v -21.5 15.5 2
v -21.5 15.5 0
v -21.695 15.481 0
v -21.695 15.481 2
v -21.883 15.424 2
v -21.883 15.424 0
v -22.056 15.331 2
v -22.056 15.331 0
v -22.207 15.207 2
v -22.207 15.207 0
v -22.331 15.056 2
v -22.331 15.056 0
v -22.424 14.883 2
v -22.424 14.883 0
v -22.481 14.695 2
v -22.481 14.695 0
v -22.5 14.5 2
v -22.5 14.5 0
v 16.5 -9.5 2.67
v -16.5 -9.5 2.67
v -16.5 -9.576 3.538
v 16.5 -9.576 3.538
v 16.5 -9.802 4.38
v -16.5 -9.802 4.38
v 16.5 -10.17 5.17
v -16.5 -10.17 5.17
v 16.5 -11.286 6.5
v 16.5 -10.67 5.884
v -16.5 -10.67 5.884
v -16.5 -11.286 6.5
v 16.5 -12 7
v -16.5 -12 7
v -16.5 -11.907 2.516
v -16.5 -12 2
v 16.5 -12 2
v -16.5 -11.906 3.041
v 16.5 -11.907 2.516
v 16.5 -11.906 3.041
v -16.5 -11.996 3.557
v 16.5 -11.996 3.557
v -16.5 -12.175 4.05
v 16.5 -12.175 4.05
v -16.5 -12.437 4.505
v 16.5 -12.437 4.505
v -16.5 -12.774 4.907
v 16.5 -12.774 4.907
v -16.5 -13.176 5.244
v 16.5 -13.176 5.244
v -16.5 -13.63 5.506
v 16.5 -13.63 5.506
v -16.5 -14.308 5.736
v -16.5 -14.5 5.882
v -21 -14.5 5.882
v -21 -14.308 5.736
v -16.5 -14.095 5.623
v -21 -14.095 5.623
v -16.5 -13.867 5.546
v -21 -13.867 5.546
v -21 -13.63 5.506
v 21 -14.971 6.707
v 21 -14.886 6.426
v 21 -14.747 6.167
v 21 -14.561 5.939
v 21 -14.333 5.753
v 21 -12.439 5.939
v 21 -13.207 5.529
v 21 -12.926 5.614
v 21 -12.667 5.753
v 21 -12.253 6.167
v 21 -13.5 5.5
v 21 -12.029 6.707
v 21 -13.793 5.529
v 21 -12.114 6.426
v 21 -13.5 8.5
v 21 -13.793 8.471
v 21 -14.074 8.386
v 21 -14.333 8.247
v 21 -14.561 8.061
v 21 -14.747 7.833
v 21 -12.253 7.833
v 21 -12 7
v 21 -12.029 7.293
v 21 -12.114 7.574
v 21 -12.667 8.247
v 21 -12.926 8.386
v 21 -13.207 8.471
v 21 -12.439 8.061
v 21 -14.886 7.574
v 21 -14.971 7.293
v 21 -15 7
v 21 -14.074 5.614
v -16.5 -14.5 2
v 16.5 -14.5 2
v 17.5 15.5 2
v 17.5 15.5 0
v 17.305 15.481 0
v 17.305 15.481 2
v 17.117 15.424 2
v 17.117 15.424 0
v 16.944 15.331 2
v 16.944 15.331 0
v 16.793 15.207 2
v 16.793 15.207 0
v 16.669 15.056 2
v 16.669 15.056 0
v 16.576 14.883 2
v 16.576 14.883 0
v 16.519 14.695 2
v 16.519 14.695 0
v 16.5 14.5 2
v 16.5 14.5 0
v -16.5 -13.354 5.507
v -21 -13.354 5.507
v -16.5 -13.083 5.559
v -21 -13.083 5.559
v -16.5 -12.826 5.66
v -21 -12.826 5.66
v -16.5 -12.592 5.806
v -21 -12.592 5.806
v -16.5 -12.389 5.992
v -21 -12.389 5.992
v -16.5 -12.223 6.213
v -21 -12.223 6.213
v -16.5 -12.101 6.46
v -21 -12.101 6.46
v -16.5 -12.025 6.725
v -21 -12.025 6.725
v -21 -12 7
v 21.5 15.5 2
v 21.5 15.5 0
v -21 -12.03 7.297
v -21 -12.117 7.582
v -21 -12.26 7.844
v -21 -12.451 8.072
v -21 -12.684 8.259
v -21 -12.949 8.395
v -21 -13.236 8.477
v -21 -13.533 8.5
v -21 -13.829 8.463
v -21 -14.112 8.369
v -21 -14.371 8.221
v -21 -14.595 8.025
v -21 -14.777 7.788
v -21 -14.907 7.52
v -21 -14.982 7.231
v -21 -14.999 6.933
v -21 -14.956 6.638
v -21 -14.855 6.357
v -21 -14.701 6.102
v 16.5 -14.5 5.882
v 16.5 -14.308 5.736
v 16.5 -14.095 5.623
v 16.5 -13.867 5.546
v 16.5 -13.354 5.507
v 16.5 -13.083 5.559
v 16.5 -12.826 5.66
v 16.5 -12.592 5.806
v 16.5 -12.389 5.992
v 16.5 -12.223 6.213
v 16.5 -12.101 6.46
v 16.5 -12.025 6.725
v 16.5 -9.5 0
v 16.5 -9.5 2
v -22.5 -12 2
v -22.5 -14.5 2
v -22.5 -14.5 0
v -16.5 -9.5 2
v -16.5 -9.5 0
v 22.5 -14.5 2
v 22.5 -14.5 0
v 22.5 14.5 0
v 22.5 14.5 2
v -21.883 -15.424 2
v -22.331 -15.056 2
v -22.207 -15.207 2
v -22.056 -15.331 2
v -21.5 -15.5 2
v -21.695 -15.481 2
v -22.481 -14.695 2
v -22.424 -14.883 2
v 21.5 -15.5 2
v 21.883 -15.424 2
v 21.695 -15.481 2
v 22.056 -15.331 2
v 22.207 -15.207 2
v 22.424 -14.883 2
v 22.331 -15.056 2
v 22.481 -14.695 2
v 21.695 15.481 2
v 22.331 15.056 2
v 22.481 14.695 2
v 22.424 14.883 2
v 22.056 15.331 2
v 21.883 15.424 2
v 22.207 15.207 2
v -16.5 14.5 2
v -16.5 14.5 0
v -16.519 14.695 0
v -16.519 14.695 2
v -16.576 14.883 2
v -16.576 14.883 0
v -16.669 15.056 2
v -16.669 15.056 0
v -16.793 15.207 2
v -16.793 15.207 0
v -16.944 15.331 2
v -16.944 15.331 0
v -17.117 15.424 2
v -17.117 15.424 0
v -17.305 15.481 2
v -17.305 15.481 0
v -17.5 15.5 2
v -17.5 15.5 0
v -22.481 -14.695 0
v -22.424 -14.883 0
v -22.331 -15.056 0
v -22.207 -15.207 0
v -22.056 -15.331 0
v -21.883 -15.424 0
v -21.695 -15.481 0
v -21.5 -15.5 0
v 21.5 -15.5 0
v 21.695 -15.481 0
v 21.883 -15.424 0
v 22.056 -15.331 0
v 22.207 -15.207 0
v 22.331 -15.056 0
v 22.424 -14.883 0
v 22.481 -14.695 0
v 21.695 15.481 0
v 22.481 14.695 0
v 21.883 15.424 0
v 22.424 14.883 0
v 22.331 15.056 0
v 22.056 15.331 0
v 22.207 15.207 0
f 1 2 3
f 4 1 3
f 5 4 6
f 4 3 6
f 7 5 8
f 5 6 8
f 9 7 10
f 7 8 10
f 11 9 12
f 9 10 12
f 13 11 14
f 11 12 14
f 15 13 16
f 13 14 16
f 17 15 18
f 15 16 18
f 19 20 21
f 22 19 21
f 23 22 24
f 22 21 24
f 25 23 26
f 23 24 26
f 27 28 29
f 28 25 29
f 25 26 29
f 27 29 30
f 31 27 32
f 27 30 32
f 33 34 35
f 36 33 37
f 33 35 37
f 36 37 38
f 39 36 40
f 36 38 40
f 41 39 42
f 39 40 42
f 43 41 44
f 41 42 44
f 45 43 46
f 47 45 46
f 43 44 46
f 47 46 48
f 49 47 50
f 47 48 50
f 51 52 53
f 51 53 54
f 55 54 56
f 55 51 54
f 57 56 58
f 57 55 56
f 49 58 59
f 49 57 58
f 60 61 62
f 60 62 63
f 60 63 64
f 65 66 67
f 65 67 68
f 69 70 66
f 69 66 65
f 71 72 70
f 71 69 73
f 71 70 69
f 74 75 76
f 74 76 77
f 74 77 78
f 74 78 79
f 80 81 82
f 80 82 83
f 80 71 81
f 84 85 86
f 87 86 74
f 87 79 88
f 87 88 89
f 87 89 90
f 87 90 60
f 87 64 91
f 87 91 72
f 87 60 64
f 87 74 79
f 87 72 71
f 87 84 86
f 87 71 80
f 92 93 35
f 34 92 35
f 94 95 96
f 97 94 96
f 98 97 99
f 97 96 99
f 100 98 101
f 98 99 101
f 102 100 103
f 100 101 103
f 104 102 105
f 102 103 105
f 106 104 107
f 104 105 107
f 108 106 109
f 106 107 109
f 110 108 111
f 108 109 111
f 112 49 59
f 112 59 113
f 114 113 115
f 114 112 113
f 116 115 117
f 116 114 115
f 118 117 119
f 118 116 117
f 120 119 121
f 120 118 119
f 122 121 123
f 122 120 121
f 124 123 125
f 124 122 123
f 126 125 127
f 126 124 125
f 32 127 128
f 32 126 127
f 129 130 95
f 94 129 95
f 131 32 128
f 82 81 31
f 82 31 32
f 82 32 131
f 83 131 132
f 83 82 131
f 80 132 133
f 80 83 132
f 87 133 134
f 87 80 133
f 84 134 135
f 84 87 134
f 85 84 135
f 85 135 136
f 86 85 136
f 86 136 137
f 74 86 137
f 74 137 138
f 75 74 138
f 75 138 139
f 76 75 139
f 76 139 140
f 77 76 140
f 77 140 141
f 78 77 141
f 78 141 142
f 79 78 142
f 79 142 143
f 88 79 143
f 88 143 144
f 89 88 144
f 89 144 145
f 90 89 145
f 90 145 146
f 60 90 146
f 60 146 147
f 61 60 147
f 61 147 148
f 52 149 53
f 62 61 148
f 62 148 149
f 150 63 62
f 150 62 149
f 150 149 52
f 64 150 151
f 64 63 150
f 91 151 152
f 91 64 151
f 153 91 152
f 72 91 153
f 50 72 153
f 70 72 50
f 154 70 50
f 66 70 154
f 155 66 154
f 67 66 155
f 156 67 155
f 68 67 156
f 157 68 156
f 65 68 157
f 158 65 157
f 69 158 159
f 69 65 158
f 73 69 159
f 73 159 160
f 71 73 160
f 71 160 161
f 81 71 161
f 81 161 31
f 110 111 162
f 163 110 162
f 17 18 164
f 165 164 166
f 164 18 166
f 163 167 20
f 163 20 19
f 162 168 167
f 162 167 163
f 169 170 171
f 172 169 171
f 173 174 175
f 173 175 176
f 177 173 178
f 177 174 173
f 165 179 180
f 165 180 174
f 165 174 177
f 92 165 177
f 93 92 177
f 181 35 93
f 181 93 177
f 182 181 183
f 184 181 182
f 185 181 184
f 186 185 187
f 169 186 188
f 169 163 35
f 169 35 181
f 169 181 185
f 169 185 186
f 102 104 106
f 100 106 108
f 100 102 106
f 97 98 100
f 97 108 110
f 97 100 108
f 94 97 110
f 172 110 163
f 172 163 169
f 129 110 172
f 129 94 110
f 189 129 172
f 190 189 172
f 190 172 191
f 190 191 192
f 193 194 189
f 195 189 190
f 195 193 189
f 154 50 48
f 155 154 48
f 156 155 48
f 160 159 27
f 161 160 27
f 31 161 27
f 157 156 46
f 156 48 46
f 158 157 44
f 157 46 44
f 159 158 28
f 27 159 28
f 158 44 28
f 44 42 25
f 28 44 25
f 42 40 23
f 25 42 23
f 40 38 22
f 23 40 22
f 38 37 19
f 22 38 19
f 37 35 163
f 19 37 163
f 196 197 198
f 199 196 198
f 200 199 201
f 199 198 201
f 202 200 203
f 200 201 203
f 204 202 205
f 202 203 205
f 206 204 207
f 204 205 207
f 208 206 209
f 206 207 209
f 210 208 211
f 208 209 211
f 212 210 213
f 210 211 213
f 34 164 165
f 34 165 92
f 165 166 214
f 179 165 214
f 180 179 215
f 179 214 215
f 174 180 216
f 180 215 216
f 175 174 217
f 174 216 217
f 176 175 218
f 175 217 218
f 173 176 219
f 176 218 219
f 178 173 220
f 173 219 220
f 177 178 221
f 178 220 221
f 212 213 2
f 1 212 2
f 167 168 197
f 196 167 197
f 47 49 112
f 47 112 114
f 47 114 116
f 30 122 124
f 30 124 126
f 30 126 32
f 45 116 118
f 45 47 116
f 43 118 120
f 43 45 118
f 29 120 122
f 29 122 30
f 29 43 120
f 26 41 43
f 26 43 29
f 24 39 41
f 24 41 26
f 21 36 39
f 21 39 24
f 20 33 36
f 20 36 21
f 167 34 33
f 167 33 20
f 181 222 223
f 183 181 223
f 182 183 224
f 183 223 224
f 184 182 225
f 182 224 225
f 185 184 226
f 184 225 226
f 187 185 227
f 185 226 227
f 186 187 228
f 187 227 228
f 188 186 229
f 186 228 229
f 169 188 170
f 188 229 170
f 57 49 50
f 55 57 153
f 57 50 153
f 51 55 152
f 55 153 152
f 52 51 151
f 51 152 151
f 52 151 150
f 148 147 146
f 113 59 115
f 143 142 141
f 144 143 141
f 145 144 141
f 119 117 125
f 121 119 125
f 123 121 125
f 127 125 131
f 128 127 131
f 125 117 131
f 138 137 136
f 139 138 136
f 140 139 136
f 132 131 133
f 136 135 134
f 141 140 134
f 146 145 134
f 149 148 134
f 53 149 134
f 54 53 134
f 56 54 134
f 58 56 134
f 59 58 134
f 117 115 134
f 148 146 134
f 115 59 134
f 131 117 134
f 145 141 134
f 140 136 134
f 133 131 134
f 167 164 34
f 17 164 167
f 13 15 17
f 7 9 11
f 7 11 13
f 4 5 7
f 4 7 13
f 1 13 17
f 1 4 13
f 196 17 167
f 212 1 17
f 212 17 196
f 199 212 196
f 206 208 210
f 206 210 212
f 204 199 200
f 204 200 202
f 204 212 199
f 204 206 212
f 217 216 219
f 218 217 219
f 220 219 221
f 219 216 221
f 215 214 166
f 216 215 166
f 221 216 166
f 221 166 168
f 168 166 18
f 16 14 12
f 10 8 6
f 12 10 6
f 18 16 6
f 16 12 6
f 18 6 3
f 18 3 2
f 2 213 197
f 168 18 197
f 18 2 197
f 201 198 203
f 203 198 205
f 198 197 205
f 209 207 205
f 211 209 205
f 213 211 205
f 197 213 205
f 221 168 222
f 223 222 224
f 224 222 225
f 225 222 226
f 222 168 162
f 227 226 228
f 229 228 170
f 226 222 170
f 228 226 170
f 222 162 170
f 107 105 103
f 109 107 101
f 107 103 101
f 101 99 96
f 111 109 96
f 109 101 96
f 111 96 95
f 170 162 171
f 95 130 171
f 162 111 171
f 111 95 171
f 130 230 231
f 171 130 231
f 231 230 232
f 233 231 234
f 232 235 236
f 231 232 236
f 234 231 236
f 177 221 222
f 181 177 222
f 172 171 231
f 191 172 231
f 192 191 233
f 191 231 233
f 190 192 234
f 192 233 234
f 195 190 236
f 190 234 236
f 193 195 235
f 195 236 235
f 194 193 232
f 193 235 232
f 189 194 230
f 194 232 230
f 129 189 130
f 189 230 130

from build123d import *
from build123d import SkipClean  # not in build123d's __all__

# Parameters (mm, degrees)
F1_DEPTH    = 2
F2_W        = 33
F2_H        = 5
F3_DEPTH    = 5
F6_R        = 1.5
F7_DEPTH    = 42
F8_T1_DEPTH = 54.6506350946
F10_DEPTH   = 39.001


# Not quite as in the source:
# - a fillet or chamfer that OpenCascade refuses, or shapes differently, is made with other operations: its cross-section is extruded or revolved along the edge and cut away or added


with BuildPart() as f1:
    # F0 (on Top) → F1 (new body)
    with BuildSketch(Plane.XY):
        with BuildLine():
            Line((-21.5, -15.5), (21.5, -15.5))
            ThreePointArc((21.5, -15.5), (22.2071067812, -15.2071067812), (22.5, -14.5))
            Line((22.5, -14.5), (22.5, 14.5))
            ThreePointArc((22.5, 14.5), (22.2071067812, 15.2071067812), (21.5, 15.5))
            Line((21.5, 15.5), (17.5, 15.5))
            ThreePointArc((17.5, 15.5), (16.7928932188, 15.2071067812), (16.5, 14.5))
            Line((16.5, 14.5), (16.5, -9.5))
            Line((16.5, -9.5), (-16.5, -9.5))
            Line((-16.5, -9.5), (-16.5, 14.5))
            ThreePointArc((-16.5, 14.5), (-16.7928932188, 15.2071067812), (-17.5, 15.5))
            Line((-17.5, 15.5), (-21.5, 15.5))
            ThreePointArc((-21.5, 15.5), (-22.2071067812, 15.2071067812), (-22.5, 14.5))
            Line((-22.5, 14.5), (-22.5, -14.5))
            ThreePointArc((-22.5, -14.5), (-22.2071067812, -15.2071067812), (-21.5, -15.5))
        make_face()
    extrude(amount=F1_DEPTH)

    # F2 (on face) → F3 (join)
    with BuildSketch(Plane.XY.offset(2)):
        with Locations((0, -12)):
            Rectangle(F2_W, F2_H)
    extrude(amount=F3_DEPTH)

    # F6 (on offset) → F7 (join, through all)
    with BuildSketch(Plane.YZ.offset(21)):
        with Locations((-13.5, 7)):
            Circle(F6_R)
    extrude(amount=-F7_DEPTH)

    # F8: fillet of radius 5 on 1 edges, made by hand

    # F8_s2 → F8_t1 (cut)
    with BuildSketch(Plane.YZ.offset(-27.3253175473)):
        with BuildLine():
            ThreePointArc((-9.5, 2.6698729811), (-10.1698729811, 5.1698729811), (-12, 7))
            Line((-12, 7), (-9.5, 7))
            Line((-9.5, 7), (-9.5, 2.6698729811))
        make_face()
    extrude(amount=F8_T1_DEPTH, mode=Mode.SUBTRACT)

    # F9 (on face) → F10 (cut, through all)
    with BuildSketch(Plane.YZ.offset(16.5)):
        with BuildLine():
            ThreePointArc((-13.6298629558, 5.5056320357), (-14.0954446994, 5.6232481669), (-14.5, 5.8819660113))
            Line((-14.5, 5.8819660112), (-14.5, 2))
            Line((-14.5, 2), (-12, 2))
            ThreePointArc((-12, 2), (-12.1749548088, 4.0503584453), (-13.6298629558, 5.5056320357))
        make_face()
    with SkipClean():  # cleaning this boolean's faces spoils the solid; the shape is the same uncleaned
        extrude(amount=-F10_DEPTH, mode=Mode.SUBTRACT)


solid = f1.part
